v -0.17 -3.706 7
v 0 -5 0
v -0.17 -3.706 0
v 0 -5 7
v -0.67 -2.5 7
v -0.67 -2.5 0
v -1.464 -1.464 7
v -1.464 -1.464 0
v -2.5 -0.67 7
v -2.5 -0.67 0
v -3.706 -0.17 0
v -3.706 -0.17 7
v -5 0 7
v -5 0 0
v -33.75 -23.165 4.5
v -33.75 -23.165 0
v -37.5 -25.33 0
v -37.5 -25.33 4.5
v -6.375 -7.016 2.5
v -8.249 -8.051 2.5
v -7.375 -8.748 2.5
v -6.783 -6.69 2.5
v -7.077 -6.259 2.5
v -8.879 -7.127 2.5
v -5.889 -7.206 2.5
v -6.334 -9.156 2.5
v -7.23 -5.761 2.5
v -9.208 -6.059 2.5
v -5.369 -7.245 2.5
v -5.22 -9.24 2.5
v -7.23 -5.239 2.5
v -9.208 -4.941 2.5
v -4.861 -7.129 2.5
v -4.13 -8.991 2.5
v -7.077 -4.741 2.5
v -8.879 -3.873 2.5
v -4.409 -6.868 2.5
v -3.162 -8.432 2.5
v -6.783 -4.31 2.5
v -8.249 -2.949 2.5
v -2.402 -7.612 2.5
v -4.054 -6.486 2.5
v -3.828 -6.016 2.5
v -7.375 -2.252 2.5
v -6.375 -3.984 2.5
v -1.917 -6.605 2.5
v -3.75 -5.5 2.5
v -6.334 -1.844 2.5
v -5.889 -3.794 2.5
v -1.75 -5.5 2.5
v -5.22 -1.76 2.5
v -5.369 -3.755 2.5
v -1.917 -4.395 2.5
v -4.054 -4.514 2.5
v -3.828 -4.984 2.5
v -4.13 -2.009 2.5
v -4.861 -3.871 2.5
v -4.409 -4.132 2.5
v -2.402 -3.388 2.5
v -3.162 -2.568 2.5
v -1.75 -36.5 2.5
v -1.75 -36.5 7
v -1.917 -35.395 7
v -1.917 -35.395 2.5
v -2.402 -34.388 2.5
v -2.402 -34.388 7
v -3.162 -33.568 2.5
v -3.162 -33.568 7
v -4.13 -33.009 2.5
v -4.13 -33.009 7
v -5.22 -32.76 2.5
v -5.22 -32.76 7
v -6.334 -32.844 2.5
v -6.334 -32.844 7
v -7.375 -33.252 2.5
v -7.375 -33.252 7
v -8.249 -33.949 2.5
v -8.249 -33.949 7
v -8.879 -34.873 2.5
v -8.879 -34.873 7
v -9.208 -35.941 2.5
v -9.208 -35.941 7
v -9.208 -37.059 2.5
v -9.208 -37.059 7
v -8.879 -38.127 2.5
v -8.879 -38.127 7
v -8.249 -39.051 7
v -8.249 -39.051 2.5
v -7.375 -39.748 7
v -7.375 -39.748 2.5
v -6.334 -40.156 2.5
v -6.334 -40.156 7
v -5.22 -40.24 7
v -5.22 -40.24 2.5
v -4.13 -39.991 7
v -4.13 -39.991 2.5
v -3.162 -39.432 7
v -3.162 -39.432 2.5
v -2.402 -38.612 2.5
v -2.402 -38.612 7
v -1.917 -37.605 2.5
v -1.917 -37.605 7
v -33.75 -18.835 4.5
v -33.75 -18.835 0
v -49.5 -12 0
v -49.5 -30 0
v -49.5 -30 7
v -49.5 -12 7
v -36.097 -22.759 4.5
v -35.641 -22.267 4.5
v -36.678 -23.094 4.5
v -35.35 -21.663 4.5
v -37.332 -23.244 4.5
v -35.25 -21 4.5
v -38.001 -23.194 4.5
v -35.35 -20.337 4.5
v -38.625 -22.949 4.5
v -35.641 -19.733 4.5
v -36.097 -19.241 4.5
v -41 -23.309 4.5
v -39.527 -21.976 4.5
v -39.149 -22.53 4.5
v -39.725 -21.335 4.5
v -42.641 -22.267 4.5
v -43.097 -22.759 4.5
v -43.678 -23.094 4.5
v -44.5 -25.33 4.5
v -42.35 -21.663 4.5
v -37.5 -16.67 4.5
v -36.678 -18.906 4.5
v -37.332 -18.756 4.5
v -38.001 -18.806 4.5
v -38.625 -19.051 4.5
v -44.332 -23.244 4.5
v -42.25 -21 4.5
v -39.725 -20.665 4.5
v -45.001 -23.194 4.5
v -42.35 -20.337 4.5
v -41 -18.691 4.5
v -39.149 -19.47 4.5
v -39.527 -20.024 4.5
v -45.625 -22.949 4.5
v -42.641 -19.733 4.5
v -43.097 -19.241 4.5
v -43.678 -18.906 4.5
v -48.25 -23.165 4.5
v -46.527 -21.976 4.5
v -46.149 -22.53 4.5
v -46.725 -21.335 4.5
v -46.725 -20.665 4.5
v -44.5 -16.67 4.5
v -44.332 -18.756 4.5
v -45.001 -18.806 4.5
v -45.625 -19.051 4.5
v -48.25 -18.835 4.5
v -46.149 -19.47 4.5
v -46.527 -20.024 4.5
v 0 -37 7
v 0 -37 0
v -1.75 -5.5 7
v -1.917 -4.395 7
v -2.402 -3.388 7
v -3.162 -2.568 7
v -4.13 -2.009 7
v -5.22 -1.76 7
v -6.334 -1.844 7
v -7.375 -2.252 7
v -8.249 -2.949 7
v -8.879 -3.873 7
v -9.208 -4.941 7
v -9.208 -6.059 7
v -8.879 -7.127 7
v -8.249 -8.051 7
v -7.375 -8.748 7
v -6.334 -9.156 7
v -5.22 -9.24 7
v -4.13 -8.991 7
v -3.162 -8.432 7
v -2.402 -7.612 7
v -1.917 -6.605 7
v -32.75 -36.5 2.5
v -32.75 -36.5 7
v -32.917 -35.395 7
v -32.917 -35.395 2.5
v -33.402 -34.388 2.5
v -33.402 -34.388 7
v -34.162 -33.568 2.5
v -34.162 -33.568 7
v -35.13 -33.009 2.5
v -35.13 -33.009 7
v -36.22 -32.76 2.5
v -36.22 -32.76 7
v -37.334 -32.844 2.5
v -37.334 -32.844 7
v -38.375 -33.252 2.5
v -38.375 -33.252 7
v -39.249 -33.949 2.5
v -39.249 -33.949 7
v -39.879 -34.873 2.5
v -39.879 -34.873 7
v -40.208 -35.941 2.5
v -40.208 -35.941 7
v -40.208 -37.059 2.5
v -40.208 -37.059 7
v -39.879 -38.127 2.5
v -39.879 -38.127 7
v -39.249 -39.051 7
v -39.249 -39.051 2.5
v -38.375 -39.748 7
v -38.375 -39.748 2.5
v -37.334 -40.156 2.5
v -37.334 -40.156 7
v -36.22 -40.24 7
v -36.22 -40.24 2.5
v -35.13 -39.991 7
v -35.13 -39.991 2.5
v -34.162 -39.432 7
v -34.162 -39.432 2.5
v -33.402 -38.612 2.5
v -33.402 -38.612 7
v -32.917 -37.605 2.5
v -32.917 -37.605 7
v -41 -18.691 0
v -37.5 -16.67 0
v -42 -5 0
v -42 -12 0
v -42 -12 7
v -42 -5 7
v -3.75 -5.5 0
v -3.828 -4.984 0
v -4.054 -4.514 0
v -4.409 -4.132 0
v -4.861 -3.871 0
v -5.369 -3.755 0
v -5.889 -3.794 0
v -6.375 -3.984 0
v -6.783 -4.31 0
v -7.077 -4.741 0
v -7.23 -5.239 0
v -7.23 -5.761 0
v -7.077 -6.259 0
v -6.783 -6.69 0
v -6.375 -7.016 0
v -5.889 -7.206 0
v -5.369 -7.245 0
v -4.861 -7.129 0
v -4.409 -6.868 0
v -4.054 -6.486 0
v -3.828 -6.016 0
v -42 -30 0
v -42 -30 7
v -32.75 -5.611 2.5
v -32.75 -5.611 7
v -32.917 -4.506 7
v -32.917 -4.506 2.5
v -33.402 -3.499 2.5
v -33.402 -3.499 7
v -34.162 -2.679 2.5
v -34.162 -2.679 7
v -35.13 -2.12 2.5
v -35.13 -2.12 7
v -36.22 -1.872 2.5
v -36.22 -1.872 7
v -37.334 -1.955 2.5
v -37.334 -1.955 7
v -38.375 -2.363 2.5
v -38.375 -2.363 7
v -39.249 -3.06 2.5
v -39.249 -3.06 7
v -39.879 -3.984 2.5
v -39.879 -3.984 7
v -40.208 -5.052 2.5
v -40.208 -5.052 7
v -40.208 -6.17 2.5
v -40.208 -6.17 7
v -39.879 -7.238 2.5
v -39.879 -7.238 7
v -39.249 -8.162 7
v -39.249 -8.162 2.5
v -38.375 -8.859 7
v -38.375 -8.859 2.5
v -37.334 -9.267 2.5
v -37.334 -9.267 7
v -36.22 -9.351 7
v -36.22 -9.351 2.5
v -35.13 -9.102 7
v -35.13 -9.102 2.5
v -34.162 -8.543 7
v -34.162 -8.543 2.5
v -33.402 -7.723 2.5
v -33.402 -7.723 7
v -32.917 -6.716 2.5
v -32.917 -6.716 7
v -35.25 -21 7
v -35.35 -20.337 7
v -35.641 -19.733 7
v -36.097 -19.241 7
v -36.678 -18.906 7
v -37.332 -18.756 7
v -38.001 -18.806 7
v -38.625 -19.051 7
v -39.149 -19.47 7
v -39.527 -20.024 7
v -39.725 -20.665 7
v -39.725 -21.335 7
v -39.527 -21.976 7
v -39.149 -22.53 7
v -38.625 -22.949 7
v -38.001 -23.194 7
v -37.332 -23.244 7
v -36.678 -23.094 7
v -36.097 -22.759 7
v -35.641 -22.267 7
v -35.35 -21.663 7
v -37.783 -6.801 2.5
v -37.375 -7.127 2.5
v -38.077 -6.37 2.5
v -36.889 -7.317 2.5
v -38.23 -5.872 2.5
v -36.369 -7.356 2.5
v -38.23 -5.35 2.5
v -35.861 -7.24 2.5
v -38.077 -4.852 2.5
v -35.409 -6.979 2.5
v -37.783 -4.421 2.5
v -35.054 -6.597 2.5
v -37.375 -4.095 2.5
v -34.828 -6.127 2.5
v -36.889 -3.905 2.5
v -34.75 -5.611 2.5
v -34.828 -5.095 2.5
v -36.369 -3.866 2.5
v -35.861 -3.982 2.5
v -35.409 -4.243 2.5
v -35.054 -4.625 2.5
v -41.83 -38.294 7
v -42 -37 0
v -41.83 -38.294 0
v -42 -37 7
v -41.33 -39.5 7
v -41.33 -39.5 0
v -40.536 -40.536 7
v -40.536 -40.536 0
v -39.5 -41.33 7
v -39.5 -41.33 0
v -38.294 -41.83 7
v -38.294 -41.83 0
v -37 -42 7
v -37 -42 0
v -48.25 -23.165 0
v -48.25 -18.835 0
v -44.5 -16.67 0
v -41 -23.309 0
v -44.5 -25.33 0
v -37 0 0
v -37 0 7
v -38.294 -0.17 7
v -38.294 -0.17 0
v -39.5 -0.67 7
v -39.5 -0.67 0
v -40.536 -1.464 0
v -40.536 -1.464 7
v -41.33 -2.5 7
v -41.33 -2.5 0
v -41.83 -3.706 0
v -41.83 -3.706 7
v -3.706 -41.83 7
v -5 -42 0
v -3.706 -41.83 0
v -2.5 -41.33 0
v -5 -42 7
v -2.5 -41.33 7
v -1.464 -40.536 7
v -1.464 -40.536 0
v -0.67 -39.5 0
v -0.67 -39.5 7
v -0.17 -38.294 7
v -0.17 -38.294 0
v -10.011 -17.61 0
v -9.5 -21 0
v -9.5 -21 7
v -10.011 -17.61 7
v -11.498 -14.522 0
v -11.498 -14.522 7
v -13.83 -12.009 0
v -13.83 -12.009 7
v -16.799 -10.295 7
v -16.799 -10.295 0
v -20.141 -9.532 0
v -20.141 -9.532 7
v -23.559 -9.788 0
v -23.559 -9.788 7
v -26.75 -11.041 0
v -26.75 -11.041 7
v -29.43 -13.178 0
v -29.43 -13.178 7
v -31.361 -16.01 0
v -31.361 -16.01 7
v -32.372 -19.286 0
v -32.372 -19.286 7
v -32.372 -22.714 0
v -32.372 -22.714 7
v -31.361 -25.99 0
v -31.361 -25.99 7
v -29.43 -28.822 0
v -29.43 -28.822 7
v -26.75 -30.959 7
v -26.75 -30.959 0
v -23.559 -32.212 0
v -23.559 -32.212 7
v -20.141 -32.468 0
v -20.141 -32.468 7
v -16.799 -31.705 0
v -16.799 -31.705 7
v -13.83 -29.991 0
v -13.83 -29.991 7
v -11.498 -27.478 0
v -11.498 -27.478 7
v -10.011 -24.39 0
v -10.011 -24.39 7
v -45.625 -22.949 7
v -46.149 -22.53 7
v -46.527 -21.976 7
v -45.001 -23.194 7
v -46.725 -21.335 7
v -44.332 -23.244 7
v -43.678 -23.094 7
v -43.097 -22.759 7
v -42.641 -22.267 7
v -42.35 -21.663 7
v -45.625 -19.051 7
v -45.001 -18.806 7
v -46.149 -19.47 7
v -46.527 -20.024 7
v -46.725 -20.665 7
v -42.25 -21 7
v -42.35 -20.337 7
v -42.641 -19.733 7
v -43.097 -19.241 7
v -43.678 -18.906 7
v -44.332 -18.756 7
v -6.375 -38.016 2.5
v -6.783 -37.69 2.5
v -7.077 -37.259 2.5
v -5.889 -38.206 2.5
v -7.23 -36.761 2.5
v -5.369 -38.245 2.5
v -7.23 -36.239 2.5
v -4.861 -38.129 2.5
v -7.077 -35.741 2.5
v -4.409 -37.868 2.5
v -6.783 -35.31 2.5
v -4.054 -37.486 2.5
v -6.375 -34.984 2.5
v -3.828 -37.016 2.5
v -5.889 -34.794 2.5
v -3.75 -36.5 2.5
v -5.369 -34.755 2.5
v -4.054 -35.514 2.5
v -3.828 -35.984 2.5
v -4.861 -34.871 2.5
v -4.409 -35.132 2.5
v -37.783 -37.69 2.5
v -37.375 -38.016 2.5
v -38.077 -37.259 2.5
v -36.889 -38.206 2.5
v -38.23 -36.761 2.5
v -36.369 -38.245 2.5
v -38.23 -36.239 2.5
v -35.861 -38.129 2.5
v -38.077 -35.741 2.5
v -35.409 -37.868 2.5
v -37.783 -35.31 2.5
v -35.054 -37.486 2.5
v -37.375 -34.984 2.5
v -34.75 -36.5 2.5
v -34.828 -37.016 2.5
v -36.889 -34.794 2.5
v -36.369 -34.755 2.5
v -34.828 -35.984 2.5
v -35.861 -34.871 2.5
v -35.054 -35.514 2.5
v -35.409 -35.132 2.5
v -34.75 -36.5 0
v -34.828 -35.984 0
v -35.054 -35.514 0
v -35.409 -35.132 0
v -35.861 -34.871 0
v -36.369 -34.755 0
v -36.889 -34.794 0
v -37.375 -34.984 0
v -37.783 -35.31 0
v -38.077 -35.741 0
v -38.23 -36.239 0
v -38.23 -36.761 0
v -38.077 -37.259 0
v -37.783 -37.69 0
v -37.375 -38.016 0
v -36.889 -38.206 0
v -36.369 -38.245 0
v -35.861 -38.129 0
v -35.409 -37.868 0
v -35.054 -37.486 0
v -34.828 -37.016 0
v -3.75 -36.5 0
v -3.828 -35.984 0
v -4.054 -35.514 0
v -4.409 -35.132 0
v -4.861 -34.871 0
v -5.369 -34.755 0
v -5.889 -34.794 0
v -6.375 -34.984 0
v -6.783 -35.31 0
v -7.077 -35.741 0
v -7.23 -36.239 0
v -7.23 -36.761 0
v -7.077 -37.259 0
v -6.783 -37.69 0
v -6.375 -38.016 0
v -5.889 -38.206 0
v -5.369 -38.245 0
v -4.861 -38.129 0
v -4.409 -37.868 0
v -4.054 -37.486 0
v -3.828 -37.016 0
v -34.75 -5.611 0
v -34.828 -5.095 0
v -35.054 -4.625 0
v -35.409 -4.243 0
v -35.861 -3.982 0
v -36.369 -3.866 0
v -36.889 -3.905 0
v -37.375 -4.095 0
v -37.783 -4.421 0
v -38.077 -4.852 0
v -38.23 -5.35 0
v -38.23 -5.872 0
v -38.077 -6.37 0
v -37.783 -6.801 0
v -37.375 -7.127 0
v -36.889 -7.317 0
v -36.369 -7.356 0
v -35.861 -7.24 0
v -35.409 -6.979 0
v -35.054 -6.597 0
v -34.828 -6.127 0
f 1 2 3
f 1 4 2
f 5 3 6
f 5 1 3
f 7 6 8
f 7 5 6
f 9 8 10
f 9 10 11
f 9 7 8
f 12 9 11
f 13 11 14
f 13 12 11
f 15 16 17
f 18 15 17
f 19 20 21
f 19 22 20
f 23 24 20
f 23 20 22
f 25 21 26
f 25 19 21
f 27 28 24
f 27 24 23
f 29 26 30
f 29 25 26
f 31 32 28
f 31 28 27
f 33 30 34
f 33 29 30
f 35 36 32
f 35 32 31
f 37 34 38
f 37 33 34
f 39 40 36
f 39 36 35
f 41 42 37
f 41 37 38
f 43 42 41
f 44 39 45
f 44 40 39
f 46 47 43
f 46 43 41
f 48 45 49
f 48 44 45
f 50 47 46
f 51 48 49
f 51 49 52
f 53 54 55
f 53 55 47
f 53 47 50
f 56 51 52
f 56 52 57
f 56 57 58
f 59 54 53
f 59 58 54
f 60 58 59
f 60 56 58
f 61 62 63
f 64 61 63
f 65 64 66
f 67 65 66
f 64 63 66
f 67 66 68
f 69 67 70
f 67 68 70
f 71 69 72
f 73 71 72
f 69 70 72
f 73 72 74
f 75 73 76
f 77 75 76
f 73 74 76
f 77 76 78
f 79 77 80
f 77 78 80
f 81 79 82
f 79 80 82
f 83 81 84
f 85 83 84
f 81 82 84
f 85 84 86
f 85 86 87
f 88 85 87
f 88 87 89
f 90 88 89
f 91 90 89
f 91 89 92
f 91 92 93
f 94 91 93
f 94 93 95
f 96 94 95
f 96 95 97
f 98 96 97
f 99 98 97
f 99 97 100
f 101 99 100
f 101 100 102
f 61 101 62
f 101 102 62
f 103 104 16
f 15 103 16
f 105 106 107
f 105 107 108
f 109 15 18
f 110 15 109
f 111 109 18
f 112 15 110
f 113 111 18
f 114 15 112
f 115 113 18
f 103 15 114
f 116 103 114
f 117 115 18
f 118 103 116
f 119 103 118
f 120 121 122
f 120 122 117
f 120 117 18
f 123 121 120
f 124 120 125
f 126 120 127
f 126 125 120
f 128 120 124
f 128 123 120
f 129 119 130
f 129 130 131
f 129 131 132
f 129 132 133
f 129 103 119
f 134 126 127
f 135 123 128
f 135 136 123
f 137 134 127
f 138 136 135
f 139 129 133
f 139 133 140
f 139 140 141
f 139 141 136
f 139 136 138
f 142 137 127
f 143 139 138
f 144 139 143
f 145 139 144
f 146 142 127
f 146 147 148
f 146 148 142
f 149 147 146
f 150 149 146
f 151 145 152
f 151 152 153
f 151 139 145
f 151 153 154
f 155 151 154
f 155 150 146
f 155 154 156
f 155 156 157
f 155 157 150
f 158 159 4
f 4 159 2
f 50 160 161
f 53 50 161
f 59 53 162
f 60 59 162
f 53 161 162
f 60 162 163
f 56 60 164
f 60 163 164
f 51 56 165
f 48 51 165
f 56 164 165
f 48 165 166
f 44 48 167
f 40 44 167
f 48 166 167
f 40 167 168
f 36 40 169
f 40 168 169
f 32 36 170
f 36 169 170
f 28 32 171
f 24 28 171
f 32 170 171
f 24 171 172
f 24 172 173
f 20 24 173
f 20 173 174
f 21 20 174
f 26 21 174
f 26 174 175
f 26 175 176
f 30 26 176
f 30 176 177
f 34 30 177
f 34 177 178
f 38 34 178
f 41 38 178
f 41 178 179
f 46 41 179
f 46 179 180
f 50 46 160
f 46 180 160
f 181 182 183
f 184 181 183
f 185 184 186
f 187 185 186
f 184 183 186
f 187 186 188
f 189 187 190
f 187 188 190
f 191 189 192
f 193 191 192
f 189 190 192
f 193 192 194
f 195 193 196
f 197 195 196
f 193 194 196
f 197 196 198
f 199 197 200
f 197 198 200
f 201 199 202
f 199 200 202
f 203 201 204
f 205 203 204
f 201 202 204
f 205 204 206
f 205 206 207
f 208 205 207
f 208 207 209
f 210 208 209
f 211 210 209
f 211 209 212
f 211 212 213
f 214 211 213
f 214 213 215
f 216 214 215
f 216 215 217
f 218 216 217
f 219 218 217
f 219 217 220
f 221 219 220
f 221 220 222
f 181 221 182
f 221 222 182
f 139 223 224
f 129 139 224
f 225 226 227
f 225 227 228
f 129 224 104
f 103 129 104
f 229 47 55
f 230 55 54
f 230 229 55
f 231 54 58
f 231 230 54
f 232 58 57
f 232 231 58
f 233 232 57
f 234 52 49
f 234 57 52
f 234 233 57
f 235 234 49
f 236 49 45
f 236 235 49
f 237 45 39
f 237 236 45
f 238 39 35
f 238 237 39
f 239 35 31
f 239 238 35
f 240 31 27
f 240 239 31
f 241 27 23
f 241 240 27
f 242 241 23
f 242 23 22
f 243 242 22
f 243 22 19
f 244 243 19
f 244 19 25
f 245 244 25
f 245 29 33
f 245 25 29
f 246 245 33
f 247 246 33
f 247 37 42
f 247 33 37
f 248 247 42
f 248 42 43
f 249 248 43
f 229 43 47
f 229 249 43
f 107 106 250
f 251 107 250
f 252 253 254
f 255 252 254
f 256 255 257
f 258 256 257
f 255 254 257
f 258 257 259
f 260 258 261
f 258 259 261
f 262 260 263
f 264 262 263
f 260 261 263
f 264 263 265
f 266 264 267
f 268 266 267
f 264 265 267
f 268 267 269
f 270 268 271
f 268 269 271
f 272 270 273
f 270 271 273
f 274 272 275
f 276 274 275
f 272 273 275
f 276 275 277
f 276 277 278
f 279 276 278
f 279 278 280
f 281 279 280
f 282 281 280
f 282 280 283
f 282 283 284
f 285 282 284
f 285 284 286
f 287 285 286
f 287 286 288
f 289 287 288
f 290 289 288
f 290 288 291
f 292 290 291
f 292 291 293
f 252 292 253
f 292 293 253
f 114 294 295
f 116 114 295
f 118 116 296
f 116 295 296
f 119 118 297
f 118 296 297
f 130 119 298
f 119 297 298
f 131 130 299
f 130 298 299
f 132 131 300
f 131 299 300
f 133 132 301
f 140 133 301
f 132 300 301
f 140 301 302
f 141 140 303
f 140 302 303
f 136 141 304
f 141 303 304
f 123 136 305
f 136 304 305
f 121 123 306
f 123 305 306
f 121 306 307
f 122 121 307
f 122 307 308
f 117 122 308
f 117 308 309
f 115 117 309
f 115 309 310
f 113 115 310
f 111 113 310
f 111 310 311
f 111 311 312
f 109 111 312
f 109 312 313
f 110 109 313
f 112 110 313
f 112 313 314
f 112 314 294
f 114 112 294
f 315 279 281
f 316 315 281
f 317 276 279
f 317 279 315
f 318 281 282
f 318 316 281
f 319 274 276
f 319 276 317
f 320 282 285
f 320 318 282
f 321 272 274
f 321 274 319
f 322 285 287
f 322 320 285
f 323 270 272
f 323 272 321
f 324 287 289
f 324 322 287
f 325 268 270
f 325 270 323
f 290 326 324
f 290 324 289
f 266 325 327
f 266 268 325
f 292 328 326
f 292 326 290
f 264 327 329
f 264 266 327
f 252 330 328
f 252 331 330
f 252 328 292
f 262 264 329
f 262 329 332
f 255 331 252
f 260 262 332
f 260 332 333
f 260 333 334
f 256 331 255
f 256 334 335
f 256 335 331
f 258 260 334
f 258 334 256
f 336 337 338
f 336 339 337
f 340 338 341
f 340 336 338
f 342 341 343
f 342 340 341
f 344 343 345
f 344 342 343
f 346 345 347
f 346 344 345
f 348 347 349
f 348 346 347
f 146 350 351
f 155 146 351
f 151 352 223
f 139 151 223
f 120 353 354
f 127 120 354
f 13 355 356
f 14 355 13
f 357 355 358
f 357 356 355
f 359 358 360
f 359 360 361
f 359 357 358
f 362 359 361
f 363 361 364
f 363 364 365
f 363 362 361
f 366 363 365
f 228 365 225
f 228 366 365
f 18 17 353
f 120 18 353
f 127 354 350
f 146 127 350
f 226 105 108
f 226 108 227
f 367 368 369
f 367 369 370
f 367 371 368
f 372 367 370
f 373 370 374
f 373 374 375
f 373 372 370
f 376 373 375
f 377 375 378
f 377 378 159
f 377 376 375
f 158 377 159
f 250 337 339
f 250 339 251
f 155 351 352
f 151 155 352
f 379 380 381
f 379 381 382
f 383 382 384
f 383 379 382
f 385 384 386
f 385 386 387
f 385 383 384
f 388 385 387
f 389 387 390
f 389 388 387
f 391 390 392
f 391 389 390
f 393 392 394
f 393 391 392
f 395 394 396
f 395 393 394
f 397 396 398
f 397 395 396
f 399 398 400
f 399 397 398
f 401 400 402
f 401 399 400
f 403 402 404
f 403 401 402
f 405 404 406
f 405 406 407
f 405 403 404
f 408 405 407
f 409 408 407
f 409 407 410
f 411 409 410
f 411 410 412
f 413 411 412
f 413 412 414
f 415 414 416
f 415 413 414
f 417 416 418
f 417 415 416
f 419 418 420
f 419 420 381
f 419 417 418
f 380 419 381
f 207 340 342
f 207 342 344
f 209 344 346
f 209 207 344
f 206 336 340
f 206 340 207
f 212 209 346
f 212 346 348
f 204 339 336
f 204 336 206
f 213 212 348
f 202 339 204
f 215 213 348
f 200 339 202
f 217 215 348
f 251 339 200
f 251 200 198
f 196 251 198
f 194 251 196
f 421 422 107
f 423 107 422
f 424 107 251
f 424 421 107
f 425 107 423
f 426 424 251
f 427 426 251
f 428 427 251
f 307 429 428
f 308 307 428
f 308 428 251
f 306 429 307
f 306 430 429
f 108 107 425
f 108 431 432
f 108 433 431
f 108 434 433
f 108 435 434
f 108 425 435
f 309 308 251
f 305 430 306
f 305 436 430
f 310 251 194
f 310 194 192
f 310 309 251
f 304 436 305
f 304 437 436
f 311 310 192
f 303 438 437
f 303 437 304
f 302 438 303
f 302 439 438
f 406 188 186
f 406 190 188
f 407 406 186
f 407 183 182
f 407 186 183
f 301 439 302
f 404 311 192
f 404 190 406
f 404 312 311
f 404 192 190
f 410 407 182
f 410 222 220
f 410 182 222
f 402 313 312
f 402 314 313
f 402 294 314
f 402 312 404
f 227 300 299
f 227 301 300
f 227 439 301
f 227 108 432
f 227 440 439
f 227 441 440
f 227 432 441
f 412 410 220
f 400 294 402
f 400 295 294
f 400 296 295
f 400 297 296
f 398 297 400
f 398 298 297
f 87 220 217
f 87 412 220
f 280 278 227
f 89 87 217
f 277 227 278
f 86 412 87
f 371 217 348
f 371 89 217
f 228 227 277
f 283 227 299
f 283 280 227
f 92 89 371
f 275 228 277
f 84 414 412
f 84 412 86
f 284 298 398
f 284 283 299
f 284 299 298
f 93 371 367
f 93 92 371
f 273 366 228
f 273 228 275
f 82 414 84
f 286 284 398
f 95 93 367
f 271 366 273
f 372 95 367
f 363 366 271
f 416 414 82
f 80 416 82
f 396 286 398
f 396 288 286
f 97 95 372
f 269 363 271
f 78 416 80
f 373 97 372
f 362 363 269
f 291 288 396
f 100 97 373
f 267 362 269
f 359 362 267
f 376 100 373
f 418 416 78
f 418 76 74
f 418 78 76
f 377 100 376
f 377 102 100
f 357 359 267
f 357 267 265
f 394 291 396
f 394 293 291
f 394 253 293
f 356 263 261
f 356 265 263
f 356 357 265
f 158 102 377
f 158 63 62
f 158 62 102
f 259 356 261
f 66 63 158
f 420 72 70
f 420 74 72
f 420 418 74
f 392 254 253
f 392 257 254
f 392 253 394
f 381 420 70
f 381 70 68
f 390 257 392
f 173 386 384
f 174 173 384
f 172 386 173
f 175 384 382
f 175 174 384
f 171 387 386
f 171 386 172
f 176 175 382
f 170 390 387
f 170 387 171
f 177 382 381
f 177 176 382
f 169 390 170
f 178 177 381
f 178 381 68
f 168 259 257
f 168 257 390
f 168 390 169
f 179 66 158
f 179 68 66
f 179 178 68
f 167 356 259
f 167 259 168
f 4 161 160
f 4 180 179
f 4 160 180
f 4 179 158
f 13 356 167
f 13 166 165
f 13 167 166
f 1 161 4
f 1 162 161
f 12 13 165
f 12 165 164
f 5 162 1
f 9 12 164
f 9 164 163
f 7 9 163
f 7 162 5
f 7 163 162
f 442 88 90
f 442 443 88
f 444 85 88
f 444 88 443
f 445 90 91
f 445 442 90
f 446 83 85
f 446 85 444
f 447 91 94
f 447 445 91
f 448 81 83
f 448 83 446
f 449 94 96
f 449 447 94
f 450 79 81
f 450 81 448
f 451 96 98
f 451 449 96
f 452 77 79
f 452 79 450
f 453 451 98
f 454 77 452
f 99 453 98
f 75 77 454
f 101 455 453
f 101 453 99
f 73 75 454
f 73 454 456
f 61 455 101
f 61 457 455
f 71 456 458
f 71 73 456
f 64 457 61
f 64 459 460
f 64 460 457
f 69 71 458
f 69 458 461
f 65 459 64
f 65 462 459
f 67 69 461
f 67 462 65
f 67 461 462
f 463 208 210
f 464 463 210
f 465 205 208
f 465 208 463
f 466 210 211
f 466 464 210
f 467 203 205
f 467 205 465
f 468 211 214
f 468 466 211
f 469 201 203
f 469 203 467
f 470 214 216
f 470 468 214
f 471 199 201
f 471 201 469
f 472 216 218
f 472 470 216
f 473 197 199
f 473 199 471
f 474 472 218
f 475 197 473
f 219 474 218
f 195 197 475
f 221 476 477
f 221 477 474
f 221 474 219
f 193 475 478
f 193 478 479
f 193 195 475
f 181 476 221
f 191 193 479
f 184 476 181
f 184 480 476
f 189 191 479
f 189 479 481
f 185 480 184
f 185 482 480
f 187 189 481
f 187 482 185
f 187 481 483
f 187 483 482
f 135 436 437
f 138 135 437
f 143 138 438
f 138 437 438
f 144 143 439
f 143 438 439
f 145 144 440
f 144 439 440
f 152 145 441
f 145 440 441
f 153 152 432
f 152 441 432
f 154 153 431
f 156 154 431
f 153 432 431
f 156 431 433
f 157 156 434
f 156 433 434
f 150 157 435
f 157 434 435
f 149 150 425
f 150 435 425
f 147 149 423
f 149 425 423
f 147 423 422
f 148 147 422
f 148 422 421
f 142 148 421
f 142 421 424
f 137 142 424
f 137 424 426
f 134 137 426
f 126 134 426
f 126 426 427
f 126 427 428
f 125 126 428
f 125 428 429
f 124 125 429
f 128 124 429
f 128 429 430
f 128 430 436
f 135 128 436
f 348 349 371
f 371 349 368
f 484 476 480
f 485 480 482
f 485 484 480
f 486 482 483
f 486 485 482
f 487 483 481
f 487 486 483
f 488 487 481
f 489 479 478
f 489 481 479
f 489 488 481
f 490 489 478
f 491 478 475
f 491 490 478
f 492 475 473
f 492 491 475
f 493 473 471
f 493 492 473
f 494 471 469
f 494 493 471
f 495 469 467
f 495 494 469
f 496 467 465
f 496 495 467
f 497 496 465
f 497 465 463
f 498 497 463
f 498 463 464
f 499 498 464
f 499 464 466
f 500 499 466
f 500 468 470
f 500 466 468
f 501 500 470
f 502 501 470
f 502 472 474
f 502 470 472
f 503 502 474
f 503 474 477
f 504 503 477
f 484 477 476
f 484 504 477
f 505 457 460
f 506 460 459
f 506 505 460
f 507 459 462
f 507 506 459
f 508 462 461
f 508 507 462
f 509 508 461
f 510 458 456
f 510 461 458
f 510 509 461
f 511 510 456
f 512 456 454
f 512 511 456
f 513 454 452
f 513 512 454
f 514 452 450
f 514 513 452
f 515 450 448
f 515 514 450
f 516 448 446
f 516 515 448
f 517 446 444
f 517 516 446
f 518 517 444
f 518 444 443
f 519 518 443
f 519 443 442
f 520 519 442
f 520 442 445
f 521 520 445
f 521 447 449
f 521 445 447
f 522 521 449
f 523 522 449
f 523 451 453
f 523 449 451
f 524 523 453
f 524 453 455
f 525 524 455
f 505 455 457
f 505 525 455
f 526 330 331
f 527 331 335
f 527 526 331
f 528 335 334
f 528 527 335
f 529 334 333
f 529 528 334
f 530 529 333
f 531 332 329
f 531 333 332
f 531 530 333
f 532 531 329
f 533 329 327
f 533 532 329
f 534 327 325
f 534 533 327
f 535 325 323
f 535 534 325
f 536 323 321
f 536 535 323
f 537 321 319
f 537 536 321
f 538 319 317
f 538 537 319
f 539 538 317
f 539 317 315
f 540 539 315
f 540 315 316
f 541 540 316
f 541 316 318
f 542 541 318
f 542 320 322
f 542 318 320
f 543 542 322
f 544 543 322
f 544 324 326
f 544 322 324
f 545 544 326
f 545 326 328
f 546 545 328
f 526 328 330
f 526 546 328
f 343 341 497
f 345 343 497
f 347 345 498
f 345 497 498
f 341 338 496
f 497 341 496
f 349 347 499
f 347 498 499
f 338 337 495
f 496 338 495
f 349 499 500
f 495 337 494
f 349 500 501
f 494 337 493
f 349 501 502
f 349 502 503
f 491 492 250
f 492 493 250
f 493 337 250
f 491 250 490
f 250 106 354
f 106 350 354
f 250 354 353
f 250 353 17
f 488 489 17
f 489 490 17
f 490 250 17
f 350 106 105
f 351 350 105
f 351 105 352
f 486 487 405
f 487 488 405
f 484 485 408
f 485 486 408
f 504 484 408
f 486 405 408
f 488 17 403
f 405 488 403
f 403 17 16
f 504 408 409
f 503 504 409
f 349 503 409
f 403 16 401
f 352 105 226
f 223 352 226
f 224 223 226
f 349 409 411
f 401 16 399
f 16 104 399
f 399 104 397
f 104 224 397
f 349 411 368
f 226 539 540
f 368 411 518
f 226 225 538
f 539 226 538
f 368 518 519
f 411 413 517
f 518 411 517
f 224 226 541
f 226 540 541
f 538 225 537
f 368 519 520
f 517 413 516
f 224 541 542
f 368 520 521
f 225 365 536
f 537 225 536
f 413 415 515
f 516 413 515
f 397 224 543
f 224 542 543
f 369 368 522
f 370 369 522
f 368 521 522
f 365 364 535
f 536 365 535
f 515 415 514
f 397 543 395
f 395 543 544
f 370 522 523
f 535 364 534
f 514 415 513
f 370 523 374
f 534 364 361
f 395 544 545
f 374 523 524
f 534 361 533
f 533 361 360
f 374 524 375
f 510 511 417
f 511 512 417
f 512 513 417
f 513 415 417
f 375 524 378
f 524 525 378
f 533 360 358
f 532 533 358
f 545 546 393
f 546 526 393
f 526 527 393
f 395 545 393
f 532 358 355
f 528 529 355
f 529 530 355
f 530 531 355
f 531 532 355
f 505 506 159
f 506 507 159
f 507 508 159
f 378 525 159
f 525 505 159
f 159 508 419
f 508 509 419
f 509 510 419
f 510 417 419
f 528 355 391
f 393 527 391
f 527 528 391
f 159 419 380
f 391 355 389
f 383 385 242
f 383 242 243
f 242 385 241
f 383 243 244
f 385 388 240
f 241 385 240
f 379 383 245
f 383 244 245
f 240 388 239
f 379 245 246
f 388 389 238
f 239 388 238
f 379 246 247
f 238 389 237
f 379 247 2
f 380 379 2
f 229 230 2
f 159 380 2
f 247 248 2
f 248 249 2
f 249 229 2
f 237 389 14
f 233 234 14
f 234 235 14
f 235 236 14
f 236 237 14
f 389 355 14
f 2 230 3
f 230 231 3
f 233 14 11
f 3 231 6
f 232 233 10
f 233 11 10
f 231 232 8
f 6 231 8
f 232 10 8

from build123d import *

# Parameters (mm, degrees)
ESQUISSE1_W             = 42
ESQUISSE1_H             = 42
ESQUISSE1_R             = 11.5
ESQUISSE1_R_2           = 1.75
ESQUISSE1_W_2           = 7.5
ESQUISSE1_H_2           = 18
BOSS_EXTRU_1_DEPTH      = 7
ESQUISSE9_R             = 2.25
ENL_V_MAT_EXTRU_2_DEPTH = 17
ENL_V_MAT_EXTRU_3_DEPTH = 4.5
ESQUISSE11_R            = 3.75
ENL_V_MAT_EXTRU_4_DEPTH = 4.5
CONG_1_R                = 5


with BuildPart() as part:
    # Esquisse1 → Boss.-Extru.1 (new body)
    # profile 1 of 2: a face of its own
    with BuildSketch(Plane.XY):
        with Locations((-21, -21)):
            Rectangle(ESQUISSE1_W, ESQUISSE1_H)
        with Locations((-21, -21)):
            Circle(ESQUISSE1_R, mode=Mode.SUBTRACT)
        with Locations((-36.5, -36.5)):
            Circle(ESQUISSE1_R_2, mode=Mode.SUBTRACT)
        with Locations((-5.5, -36.5)):
            Circle(ESQUISSE1_R_2, mode=Mode.SUBTRACT)
        with Locations((-5.5, -5.5)):
            Circle(ESQUISSE1_R_2, mode=Mode.SUBTRACT)
        with Locations((-36.5, -5.611040912)):
            Circle(ESQUISSE1_R_2, mode=Mode.SUBTRACT)
    # profile 2 of 2: a face of its own
    with BuildSketch(Plane.XY):
        with Locations((-45.75, -21)):
            Rectangle(ESQUISSE1_W_2, ESQUISSE1_H_2)
    extrude(amount=BOSS_EXTRU_1_DEPTH)

    # Esquisse9 → Enlèv. mat.-Extru.2 (cut)
    with BuildSketch(Plane.XY.offset(7)):
        with Locations((-44.5, -21)):
            Circle(ESQUISSE9_R)
        with Locations((-37.5, -21)):
            Circle(ESQUISSE9_R)
    extrude(amount=-ENL_V_MAT_EXTRU_2_DEPTH, mode=Mode.SUBTRACT)

    # Esquisse10 → Enlèv. mat.-Extru.3 (cut)
    with BuildSketch(Plane(origin=(0, 0, 0), x_dir=(-1, 0, 0), z_dir=(0, 0, -1))):
        Polygon((44.5, -25.330127019), (48.25, -23.165063509), (48.25, -18.834936491), (44.5, -16.669872981), (40.75, -18.834936491), (40.75, -23.165063509), align=None)
        Polygon((37.5, -25.330127019), (41.25, -23.165063509), (41.25, -18.834936491), (37.5, -16.669872981), (33.75, -18.834936491), (33.75, -23.165063509), align=None)
    extrude(amount=-ENL_V_MAT_EXTRU_3_DEPTH, mode=Mode.SUBTRACT)

    # Esquisse11 → Enlèv. mat.-Extru.4 (cut)
    with BuildSketch(Plane.XY.offset(7)):
        with Locations((-36.5, -5.611040912)):
            Circle(ESQUISSE11_R)
        with Locations((-5.5, -5.5)):
            Circle(ESQUISSE11_R)
        with Locations((-5.5, -36.5)):
            Circle(ESQUISSE11_R)
        with Locations((-36.5, -36.5)):
            Circle(ESQUISSE11_R)
    extrude(amount=-ENL_V_MAT_EXTRU_4_DEPTH, mode=Mode.SUBTRACT)

    # Congé1
    cong_1_edges = [part.edges().sort_by_distance(p)[0] for p in [
        (0, 0, 3.5),
        (0, -42, 3.5),
        (-42, -42, 3.5),
        (-42, 0, 3.5),
    ]]
    fillet(cong_1_edges, radius=CONG_1_R)


solid = part.part
